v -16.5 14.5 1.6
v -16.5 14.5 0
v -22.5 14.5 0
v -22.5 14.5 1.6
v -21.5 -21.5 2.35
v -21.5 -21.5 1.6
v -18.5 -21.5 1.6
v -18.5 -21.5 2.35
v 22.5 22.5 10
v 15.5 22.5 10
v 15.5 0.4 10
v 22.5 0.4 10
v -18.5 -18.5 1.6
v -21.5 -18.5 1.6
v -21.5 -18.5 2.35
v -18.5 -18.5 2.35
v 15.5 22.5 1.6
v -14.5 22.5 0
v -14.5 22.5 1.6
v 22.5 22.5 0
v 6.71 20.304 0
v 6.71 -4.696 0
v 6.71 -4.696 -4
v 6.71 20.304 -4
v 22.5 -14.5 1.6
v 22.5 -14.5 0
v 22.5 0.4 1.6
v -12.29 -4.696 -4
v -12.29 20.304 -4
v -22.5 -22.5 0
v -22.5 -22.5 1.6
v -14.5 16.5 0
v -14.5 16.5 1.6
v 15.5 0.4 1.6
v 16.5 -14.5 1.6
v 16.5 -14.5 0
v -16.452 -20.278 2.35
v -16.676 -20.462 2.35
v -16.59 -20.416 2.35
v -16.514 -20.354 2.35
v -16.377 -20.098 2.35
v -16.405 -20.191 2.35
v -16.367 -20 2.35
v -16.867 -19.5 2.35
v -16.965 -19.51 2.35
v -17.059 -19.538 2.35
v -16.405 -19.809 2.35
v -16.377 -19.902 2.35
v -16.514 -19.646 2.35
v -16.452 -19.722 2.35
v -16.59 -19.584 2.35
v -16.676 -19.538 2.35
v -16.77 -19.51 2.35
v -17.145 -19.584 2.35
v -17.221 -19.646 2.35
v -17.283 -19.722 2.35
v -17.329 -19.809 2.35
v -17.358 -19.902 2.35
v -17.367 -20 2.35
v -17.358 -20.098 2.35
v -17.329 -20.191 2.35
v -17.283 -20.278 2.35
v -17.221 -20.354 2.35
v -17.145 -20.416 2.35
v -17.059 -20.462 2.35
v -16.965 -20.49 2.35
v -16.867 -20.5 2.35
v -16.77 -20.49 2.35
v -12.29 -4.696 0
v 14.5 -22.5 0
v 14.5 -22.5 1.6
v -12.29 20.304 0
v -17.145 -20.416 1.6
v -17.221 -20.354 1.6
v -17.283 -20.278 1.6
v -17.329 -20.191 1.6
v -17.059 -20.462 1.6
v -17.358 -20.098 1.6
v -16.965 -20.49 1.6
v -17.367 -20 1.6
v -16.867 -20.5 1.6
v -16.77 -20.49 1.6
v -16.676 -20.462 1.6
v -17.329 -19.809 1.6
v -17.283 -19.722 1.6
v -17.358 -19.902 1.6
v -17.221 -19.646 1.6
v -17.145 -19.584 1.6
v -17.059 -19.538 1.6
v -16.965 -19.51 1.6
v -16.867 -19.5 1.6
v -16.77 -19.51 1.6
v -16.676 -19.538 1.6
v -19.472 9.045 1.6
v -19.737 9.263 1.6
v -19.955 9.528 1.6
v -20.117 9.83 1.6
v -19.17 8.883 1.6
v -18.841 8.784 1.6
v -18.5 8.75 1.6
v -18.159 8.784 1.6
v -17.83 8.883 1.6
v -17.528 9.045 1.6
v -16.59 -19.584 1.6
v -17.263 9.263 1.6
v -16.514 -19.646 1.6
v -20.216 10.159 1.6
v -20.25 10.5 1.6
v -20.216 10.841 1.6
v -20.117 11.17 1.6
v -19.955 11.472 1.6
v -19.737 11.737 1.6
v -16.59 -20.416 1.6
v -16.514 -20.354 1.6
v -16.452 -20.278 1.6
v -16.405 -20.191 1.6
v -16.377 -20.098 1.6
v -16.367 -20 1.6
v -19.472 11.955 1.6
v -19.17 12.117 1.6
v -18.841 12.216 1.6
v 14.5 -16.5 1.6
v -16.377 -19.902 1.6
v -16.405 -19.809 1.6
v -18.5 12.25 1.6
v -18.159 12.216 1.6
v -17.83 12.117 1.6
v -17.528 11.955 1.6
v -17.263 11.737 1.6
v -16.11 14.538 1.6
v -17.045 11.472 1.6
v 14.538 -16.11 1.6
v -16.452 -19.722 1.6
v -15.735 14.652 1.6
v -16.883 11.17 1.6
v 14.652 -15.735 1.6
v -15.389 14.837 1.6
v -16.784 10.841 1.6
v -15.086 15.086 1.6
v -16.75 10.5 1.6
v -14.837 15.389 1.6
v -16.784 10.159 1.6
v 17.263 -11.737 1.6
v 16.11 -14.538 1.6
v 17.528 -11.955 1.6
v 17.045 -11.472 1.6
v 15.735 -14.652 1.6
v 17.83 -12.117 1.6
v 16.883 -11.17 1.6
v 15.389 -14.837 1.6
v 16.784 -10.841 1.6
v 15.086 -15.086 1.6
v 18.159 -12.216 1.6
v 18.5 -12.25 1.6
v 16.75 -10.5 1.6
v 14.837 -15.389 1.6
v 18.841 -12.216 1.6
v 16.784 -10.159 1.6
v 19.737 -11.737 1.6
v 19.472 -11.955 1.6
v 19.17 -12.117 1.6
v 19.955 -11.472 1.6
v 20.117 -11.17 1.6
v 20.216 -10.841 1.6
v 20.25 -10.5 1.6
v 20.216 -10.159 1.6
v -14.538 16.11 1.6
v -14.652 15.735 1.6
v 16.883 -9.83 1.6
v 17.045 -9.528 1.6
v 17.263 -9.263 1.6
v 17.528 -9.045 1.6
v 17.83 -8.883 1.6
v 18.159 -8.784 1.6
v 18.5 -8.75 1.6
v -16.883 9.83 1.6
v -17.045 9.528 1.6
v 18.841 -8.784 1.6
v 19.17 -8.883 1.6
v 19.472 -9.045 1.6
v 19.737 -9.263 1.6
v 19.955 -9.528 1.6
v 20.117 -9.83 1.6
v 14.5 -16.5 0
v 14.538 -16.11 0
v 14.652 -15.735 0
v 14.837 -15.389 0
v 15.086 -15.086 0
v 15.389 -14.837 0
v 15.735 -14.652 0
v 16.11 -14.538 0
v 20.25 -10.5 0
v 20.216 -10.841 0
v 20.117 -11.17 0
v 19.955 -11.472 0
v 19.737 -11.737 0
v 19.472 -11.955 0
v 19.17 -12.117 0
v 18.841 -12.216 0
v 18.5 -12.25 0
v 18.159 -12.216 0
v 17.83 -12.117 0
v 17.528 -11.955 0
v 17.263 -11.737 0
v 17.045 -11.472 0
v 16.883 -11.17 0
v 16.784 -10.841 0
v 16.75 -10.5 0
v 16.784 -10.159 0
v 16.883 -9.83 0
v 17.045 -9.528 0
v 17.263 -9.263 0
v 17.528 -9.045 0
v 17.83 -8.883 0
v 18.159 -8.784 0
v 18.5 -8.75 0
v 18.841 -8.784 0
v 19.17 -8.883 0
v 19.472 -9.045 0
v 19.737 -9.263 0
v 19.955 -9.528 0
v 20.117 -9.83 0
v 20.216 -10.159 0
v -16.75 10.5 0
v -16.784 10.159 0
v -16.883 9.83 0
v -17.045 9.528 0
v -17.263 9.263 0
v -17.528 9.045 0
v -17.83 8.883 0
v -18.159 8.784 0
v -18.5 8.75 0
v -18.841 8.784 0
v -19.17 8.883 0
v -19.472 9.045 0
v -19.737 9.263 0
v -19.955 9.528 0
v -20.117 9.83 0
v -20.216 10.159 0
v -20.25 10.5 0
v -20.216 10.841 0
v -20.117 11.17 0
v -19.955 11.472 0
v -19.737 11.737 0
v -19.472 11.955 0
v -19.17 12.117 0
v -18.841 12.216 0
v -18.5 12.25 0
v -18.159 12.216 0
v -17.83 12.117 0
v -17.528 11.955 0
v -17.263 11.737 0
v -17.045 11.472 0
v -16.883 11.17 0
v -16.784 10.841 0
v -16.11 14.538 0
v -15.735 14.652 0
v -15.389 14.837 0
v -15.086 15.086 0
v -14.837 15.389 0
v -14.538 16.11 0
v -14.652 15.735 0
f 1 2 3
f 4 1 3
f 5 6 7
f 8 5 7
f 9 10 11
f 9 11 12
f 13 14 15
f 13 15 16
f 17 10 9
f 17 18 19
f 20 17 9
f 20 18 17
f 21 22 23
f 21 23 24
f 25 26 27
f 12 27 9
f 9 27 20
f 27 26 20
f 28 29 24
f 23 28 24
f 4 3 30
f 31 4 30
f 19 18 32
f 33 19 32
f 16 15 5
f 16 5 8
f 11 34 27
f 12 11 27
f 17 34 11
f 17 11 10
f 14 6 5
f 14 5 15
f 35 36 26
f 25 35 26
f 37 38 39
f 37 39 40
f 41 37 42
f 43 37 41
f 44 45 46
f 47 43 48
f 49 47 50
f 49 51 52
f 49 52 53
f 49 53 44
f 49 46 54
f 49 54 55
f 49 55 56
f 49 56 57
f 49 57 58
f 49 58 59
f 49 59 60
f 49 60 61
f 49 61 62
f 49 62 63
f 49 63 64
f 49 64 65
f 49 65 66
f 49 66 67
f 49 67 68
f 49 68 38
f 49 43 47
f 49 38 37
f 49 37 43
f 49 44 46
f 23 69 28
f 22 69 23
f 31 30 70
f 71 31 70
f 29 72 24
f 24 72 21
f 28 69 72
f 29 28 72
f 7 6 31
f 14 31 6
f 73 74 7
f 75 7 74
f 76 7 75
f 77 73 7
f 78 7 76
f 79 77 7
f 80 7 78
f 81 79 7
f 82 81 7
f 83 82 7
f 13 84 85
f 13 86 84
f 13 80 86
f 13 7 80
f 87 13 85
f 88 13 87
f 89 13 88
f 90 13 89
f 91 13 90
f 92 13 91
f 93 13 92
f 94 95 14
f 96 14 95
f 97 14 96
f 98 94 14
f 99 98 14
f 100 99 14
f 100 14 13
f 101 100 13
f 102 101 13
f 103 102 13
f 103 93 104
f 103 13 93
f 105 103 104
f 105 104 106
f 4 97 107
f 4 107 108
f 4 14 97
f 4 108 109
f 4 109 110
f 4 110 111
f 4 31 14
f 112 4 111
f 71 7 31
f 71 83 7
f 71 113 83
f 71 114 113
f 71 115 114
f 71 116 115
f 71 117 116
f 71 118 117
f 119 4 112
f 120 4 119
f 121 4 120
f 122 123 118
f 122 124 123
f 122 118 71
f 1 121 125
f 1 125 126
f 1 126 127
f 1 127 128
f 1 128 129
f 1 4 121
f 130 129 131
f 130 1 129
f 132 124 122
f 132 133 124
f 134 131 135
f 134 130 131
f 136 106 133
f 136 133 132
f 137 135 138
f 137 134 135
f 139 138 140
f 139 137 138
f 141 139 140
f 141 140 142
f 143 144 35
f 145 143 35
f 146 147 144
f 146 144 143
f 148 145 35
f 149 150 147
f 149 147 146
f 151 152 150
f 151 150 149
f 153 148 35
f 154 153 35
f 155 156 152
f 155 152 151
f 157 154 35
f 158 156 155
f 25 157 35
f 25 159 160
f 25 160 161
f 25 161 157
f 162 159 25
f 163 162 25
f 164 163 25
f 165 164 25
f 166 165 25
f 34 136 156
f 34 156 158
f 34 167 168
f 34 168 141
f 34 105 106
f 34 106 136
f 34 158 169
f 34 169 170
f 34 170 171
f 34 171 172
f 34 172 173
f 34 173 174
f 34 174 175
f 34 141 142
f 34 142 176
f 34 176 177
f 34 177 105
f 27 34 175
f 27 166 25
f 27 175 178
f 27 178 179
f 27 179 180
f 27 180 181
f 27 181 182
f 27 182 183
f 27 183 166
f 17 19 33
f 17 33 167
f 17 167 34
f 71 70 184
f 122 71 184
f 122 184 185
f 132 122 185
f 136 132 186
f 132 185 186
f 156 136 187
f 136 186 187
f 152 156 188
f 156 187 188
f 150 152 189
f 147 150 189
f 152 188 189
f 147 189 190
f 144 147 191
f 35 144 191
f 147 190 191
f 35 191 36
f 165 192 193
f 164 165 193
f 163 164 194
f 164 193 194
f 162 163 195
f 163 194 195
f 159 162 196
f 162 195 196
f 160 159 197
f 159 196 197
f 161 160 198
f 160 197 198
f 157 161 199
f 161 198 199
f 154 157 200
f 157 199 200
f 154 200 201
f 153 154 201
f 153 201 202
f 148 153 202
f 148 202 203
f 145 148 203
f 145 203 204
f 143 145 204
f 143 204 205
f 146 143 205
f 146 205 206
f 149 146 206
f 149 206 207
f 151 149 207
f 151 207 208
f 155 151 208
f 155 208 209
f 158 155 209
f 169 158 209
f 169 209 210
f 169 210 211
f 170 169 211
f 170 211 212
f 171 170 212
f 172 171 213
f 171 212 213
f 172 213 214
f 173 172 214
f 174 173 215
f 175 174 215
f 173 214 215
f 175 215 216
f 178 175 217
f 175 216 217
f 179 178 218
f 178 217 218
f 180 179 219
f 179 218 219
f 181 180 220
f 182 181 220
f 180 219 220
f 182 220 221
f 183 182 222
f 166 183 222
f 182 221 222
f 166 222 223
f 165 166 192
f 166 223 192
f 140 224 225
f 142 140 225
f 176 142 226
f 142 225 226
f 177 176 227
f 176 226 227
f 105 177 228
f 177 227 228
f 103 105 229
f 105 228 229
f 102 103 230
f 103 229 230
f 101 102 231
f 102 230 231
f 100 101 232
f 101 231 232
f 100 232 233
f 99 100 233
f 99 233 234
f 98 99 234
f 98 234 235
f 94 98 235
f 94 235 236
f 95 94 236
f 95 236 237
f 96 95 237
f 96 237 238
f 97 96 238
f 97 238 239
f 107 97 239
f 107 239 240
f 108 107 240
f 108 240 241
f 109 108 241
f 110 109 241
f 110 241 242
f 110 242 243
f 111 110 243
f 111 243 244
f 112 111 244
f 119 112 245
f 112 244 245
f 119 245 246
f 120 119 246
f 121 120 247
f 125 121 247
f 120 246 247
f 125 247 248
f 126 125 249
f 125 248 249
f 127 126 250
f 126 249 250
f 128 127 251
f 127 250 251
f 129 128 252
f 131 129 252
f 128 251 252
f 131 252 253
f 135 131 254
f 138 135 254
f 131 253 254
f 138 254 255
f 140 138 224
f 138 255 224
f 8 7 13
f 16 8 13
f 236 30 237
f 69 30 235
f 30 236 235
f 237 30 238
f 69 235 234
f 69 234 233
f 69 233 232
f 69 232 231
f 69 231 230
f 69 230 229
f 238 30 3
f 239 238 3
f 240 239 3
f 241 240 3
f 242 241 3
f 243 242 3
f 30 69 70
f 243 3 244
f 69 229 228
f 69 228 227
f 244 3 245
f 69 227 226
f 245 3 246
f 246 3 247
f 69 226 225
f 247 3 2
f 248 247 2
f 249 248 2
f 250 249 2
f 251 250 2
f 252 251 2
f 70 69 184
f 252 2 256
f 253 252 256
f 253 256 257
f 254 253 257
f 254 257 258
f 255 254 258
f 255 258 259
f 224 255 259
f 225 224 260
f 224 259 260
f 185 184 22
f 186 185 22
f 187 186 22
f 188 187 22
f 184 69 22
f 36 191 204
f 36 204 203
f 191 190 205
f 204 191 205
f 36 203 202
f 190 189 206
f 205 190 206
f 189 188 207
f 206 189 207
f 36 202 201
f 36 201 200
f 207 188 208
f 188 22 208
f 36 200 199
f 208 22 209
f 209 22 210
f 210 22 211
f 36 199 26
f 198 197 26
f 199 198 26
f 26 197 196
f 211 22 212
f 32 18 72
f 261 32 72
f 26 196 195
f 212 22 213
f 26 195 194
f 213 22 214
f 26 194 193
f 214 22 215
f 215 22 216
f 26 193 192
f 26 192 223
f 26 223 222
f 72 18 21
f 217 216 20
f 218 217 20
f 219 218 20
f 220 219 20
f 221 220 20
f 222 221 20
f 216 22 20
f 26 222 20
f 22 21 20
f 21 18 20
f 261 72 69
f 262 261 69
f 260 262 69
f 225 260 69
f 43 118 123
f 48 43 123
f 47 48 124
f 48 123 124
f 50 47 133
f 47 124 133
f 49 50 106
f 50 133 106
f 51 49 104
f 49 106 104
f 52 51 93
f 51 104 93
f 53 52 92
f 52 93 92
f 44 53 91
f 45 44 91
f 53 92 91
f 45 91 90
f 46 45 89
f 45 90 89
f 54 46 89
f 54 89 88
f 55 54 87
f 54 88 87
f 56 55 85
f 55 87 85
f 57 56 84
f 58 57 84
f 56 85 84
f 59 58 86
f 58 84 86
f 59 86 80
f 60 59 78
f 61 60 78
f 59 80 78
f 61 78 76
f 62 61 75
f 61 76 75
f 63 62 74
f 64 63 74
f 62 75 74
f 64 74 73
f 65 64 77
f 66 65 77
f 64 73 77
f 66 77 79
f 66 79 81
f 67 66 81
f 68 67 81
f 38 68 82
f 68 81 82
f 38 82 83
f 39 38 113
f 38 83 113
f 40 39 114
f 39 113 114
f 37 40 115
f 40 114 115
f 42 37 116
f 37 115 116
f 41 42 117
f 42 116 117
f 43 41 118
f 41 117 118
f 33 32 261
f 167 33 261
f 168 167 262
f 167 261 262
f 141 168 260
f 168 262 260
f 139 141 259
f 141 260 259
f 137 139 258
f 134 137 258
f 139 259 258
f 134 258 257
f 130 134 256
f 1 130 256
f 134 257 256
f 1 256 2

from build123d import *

# Parameters (mm, degrees)
F1_DEPTH = 1.6
F2_W     = 19
F2_H     = 25
F3_DEPTH = 5.6
F4_W     = 7
F4_H     = 22.1
F5_DEPTH = 8.4
F6_W     = 3
F6_H     = 3
F6_R     = 0.5
F7_DEPTH = 0.75
F8_R     = 1.75
F9_DEPTH = 2


with BuildPart() as f1:
    # F0 (on Top) → F1 (new body)
    with BuildSketch(Plane.XY):
        with BuildLine():
            Line((-22.5, -22.5), (14.5, -22.5))
            Line((14.5, -22.5), (14.5, -16.5))
            ThreePointArc((14.5, -16.5), (15.085786, -15.085786), (16.5, -14.5))
            Line((16.5, -14.5), (22.5, -14.5))
            Line((22.5, -14.5), (22.5, 22.5))
            Line((22.5, 22.5), (-14.5, 22.5))
            Line((-14.5, 22.5), (-14.5, 16.5))
            ThreePointArc((-14.5, 16.5), (-15.085786, 15.085786), (-16.5, 14.5))
            Line((-16.5, 14.5), (-22.5, 14.5))
            Line((-22.5, 14.5), (-22.5, -22.5))
        make_face()
    extrude(amount=F1_DEPTH)

    # F2 (on face) → F3 (join)
    with BuildSketch(Plane.XY.offset(1.6)):
        with Locations((-2.789866, 7.80402)):
            Rectangle(F2_W, F2_H)
    extrude(amount=-F3_DEPTH)

    # F4 (on face) → F5 (join)
    with BuildSketch(Plane.XY.offset(1.6)):
        with Locations((19, 11.45)):
            Rectangle(F4_W, F4_H)
    extrude(amount=F5_DEPTH)

    # F6 (on face) → F7 (join)
    with BuildSketch(Plane.XY.offset(1.6)):
        with Locations((-20, -20)):
            Rectangle(F6_W, F6_H)
        with Locations((-16.867438, -20)):
            Circle(F6_R)
    extrude(amount=F7_DEPTH)

    # F8 (on face) → F9 (cut)
    with BuildSketch(Plane(origin=(0, 0, 0), x_dir=(1, 0, 0), z_dir=(0, 0, -1))):
        with Locations((-18.5, -10.5)):
            Circle(F8_R)
        with Locations((18.5, 10.5)):
            Circle(F8_R)
    extrude(amount=-F9_DEPTH, mode=Mode.SUBTRACT)


solid = f1.part
